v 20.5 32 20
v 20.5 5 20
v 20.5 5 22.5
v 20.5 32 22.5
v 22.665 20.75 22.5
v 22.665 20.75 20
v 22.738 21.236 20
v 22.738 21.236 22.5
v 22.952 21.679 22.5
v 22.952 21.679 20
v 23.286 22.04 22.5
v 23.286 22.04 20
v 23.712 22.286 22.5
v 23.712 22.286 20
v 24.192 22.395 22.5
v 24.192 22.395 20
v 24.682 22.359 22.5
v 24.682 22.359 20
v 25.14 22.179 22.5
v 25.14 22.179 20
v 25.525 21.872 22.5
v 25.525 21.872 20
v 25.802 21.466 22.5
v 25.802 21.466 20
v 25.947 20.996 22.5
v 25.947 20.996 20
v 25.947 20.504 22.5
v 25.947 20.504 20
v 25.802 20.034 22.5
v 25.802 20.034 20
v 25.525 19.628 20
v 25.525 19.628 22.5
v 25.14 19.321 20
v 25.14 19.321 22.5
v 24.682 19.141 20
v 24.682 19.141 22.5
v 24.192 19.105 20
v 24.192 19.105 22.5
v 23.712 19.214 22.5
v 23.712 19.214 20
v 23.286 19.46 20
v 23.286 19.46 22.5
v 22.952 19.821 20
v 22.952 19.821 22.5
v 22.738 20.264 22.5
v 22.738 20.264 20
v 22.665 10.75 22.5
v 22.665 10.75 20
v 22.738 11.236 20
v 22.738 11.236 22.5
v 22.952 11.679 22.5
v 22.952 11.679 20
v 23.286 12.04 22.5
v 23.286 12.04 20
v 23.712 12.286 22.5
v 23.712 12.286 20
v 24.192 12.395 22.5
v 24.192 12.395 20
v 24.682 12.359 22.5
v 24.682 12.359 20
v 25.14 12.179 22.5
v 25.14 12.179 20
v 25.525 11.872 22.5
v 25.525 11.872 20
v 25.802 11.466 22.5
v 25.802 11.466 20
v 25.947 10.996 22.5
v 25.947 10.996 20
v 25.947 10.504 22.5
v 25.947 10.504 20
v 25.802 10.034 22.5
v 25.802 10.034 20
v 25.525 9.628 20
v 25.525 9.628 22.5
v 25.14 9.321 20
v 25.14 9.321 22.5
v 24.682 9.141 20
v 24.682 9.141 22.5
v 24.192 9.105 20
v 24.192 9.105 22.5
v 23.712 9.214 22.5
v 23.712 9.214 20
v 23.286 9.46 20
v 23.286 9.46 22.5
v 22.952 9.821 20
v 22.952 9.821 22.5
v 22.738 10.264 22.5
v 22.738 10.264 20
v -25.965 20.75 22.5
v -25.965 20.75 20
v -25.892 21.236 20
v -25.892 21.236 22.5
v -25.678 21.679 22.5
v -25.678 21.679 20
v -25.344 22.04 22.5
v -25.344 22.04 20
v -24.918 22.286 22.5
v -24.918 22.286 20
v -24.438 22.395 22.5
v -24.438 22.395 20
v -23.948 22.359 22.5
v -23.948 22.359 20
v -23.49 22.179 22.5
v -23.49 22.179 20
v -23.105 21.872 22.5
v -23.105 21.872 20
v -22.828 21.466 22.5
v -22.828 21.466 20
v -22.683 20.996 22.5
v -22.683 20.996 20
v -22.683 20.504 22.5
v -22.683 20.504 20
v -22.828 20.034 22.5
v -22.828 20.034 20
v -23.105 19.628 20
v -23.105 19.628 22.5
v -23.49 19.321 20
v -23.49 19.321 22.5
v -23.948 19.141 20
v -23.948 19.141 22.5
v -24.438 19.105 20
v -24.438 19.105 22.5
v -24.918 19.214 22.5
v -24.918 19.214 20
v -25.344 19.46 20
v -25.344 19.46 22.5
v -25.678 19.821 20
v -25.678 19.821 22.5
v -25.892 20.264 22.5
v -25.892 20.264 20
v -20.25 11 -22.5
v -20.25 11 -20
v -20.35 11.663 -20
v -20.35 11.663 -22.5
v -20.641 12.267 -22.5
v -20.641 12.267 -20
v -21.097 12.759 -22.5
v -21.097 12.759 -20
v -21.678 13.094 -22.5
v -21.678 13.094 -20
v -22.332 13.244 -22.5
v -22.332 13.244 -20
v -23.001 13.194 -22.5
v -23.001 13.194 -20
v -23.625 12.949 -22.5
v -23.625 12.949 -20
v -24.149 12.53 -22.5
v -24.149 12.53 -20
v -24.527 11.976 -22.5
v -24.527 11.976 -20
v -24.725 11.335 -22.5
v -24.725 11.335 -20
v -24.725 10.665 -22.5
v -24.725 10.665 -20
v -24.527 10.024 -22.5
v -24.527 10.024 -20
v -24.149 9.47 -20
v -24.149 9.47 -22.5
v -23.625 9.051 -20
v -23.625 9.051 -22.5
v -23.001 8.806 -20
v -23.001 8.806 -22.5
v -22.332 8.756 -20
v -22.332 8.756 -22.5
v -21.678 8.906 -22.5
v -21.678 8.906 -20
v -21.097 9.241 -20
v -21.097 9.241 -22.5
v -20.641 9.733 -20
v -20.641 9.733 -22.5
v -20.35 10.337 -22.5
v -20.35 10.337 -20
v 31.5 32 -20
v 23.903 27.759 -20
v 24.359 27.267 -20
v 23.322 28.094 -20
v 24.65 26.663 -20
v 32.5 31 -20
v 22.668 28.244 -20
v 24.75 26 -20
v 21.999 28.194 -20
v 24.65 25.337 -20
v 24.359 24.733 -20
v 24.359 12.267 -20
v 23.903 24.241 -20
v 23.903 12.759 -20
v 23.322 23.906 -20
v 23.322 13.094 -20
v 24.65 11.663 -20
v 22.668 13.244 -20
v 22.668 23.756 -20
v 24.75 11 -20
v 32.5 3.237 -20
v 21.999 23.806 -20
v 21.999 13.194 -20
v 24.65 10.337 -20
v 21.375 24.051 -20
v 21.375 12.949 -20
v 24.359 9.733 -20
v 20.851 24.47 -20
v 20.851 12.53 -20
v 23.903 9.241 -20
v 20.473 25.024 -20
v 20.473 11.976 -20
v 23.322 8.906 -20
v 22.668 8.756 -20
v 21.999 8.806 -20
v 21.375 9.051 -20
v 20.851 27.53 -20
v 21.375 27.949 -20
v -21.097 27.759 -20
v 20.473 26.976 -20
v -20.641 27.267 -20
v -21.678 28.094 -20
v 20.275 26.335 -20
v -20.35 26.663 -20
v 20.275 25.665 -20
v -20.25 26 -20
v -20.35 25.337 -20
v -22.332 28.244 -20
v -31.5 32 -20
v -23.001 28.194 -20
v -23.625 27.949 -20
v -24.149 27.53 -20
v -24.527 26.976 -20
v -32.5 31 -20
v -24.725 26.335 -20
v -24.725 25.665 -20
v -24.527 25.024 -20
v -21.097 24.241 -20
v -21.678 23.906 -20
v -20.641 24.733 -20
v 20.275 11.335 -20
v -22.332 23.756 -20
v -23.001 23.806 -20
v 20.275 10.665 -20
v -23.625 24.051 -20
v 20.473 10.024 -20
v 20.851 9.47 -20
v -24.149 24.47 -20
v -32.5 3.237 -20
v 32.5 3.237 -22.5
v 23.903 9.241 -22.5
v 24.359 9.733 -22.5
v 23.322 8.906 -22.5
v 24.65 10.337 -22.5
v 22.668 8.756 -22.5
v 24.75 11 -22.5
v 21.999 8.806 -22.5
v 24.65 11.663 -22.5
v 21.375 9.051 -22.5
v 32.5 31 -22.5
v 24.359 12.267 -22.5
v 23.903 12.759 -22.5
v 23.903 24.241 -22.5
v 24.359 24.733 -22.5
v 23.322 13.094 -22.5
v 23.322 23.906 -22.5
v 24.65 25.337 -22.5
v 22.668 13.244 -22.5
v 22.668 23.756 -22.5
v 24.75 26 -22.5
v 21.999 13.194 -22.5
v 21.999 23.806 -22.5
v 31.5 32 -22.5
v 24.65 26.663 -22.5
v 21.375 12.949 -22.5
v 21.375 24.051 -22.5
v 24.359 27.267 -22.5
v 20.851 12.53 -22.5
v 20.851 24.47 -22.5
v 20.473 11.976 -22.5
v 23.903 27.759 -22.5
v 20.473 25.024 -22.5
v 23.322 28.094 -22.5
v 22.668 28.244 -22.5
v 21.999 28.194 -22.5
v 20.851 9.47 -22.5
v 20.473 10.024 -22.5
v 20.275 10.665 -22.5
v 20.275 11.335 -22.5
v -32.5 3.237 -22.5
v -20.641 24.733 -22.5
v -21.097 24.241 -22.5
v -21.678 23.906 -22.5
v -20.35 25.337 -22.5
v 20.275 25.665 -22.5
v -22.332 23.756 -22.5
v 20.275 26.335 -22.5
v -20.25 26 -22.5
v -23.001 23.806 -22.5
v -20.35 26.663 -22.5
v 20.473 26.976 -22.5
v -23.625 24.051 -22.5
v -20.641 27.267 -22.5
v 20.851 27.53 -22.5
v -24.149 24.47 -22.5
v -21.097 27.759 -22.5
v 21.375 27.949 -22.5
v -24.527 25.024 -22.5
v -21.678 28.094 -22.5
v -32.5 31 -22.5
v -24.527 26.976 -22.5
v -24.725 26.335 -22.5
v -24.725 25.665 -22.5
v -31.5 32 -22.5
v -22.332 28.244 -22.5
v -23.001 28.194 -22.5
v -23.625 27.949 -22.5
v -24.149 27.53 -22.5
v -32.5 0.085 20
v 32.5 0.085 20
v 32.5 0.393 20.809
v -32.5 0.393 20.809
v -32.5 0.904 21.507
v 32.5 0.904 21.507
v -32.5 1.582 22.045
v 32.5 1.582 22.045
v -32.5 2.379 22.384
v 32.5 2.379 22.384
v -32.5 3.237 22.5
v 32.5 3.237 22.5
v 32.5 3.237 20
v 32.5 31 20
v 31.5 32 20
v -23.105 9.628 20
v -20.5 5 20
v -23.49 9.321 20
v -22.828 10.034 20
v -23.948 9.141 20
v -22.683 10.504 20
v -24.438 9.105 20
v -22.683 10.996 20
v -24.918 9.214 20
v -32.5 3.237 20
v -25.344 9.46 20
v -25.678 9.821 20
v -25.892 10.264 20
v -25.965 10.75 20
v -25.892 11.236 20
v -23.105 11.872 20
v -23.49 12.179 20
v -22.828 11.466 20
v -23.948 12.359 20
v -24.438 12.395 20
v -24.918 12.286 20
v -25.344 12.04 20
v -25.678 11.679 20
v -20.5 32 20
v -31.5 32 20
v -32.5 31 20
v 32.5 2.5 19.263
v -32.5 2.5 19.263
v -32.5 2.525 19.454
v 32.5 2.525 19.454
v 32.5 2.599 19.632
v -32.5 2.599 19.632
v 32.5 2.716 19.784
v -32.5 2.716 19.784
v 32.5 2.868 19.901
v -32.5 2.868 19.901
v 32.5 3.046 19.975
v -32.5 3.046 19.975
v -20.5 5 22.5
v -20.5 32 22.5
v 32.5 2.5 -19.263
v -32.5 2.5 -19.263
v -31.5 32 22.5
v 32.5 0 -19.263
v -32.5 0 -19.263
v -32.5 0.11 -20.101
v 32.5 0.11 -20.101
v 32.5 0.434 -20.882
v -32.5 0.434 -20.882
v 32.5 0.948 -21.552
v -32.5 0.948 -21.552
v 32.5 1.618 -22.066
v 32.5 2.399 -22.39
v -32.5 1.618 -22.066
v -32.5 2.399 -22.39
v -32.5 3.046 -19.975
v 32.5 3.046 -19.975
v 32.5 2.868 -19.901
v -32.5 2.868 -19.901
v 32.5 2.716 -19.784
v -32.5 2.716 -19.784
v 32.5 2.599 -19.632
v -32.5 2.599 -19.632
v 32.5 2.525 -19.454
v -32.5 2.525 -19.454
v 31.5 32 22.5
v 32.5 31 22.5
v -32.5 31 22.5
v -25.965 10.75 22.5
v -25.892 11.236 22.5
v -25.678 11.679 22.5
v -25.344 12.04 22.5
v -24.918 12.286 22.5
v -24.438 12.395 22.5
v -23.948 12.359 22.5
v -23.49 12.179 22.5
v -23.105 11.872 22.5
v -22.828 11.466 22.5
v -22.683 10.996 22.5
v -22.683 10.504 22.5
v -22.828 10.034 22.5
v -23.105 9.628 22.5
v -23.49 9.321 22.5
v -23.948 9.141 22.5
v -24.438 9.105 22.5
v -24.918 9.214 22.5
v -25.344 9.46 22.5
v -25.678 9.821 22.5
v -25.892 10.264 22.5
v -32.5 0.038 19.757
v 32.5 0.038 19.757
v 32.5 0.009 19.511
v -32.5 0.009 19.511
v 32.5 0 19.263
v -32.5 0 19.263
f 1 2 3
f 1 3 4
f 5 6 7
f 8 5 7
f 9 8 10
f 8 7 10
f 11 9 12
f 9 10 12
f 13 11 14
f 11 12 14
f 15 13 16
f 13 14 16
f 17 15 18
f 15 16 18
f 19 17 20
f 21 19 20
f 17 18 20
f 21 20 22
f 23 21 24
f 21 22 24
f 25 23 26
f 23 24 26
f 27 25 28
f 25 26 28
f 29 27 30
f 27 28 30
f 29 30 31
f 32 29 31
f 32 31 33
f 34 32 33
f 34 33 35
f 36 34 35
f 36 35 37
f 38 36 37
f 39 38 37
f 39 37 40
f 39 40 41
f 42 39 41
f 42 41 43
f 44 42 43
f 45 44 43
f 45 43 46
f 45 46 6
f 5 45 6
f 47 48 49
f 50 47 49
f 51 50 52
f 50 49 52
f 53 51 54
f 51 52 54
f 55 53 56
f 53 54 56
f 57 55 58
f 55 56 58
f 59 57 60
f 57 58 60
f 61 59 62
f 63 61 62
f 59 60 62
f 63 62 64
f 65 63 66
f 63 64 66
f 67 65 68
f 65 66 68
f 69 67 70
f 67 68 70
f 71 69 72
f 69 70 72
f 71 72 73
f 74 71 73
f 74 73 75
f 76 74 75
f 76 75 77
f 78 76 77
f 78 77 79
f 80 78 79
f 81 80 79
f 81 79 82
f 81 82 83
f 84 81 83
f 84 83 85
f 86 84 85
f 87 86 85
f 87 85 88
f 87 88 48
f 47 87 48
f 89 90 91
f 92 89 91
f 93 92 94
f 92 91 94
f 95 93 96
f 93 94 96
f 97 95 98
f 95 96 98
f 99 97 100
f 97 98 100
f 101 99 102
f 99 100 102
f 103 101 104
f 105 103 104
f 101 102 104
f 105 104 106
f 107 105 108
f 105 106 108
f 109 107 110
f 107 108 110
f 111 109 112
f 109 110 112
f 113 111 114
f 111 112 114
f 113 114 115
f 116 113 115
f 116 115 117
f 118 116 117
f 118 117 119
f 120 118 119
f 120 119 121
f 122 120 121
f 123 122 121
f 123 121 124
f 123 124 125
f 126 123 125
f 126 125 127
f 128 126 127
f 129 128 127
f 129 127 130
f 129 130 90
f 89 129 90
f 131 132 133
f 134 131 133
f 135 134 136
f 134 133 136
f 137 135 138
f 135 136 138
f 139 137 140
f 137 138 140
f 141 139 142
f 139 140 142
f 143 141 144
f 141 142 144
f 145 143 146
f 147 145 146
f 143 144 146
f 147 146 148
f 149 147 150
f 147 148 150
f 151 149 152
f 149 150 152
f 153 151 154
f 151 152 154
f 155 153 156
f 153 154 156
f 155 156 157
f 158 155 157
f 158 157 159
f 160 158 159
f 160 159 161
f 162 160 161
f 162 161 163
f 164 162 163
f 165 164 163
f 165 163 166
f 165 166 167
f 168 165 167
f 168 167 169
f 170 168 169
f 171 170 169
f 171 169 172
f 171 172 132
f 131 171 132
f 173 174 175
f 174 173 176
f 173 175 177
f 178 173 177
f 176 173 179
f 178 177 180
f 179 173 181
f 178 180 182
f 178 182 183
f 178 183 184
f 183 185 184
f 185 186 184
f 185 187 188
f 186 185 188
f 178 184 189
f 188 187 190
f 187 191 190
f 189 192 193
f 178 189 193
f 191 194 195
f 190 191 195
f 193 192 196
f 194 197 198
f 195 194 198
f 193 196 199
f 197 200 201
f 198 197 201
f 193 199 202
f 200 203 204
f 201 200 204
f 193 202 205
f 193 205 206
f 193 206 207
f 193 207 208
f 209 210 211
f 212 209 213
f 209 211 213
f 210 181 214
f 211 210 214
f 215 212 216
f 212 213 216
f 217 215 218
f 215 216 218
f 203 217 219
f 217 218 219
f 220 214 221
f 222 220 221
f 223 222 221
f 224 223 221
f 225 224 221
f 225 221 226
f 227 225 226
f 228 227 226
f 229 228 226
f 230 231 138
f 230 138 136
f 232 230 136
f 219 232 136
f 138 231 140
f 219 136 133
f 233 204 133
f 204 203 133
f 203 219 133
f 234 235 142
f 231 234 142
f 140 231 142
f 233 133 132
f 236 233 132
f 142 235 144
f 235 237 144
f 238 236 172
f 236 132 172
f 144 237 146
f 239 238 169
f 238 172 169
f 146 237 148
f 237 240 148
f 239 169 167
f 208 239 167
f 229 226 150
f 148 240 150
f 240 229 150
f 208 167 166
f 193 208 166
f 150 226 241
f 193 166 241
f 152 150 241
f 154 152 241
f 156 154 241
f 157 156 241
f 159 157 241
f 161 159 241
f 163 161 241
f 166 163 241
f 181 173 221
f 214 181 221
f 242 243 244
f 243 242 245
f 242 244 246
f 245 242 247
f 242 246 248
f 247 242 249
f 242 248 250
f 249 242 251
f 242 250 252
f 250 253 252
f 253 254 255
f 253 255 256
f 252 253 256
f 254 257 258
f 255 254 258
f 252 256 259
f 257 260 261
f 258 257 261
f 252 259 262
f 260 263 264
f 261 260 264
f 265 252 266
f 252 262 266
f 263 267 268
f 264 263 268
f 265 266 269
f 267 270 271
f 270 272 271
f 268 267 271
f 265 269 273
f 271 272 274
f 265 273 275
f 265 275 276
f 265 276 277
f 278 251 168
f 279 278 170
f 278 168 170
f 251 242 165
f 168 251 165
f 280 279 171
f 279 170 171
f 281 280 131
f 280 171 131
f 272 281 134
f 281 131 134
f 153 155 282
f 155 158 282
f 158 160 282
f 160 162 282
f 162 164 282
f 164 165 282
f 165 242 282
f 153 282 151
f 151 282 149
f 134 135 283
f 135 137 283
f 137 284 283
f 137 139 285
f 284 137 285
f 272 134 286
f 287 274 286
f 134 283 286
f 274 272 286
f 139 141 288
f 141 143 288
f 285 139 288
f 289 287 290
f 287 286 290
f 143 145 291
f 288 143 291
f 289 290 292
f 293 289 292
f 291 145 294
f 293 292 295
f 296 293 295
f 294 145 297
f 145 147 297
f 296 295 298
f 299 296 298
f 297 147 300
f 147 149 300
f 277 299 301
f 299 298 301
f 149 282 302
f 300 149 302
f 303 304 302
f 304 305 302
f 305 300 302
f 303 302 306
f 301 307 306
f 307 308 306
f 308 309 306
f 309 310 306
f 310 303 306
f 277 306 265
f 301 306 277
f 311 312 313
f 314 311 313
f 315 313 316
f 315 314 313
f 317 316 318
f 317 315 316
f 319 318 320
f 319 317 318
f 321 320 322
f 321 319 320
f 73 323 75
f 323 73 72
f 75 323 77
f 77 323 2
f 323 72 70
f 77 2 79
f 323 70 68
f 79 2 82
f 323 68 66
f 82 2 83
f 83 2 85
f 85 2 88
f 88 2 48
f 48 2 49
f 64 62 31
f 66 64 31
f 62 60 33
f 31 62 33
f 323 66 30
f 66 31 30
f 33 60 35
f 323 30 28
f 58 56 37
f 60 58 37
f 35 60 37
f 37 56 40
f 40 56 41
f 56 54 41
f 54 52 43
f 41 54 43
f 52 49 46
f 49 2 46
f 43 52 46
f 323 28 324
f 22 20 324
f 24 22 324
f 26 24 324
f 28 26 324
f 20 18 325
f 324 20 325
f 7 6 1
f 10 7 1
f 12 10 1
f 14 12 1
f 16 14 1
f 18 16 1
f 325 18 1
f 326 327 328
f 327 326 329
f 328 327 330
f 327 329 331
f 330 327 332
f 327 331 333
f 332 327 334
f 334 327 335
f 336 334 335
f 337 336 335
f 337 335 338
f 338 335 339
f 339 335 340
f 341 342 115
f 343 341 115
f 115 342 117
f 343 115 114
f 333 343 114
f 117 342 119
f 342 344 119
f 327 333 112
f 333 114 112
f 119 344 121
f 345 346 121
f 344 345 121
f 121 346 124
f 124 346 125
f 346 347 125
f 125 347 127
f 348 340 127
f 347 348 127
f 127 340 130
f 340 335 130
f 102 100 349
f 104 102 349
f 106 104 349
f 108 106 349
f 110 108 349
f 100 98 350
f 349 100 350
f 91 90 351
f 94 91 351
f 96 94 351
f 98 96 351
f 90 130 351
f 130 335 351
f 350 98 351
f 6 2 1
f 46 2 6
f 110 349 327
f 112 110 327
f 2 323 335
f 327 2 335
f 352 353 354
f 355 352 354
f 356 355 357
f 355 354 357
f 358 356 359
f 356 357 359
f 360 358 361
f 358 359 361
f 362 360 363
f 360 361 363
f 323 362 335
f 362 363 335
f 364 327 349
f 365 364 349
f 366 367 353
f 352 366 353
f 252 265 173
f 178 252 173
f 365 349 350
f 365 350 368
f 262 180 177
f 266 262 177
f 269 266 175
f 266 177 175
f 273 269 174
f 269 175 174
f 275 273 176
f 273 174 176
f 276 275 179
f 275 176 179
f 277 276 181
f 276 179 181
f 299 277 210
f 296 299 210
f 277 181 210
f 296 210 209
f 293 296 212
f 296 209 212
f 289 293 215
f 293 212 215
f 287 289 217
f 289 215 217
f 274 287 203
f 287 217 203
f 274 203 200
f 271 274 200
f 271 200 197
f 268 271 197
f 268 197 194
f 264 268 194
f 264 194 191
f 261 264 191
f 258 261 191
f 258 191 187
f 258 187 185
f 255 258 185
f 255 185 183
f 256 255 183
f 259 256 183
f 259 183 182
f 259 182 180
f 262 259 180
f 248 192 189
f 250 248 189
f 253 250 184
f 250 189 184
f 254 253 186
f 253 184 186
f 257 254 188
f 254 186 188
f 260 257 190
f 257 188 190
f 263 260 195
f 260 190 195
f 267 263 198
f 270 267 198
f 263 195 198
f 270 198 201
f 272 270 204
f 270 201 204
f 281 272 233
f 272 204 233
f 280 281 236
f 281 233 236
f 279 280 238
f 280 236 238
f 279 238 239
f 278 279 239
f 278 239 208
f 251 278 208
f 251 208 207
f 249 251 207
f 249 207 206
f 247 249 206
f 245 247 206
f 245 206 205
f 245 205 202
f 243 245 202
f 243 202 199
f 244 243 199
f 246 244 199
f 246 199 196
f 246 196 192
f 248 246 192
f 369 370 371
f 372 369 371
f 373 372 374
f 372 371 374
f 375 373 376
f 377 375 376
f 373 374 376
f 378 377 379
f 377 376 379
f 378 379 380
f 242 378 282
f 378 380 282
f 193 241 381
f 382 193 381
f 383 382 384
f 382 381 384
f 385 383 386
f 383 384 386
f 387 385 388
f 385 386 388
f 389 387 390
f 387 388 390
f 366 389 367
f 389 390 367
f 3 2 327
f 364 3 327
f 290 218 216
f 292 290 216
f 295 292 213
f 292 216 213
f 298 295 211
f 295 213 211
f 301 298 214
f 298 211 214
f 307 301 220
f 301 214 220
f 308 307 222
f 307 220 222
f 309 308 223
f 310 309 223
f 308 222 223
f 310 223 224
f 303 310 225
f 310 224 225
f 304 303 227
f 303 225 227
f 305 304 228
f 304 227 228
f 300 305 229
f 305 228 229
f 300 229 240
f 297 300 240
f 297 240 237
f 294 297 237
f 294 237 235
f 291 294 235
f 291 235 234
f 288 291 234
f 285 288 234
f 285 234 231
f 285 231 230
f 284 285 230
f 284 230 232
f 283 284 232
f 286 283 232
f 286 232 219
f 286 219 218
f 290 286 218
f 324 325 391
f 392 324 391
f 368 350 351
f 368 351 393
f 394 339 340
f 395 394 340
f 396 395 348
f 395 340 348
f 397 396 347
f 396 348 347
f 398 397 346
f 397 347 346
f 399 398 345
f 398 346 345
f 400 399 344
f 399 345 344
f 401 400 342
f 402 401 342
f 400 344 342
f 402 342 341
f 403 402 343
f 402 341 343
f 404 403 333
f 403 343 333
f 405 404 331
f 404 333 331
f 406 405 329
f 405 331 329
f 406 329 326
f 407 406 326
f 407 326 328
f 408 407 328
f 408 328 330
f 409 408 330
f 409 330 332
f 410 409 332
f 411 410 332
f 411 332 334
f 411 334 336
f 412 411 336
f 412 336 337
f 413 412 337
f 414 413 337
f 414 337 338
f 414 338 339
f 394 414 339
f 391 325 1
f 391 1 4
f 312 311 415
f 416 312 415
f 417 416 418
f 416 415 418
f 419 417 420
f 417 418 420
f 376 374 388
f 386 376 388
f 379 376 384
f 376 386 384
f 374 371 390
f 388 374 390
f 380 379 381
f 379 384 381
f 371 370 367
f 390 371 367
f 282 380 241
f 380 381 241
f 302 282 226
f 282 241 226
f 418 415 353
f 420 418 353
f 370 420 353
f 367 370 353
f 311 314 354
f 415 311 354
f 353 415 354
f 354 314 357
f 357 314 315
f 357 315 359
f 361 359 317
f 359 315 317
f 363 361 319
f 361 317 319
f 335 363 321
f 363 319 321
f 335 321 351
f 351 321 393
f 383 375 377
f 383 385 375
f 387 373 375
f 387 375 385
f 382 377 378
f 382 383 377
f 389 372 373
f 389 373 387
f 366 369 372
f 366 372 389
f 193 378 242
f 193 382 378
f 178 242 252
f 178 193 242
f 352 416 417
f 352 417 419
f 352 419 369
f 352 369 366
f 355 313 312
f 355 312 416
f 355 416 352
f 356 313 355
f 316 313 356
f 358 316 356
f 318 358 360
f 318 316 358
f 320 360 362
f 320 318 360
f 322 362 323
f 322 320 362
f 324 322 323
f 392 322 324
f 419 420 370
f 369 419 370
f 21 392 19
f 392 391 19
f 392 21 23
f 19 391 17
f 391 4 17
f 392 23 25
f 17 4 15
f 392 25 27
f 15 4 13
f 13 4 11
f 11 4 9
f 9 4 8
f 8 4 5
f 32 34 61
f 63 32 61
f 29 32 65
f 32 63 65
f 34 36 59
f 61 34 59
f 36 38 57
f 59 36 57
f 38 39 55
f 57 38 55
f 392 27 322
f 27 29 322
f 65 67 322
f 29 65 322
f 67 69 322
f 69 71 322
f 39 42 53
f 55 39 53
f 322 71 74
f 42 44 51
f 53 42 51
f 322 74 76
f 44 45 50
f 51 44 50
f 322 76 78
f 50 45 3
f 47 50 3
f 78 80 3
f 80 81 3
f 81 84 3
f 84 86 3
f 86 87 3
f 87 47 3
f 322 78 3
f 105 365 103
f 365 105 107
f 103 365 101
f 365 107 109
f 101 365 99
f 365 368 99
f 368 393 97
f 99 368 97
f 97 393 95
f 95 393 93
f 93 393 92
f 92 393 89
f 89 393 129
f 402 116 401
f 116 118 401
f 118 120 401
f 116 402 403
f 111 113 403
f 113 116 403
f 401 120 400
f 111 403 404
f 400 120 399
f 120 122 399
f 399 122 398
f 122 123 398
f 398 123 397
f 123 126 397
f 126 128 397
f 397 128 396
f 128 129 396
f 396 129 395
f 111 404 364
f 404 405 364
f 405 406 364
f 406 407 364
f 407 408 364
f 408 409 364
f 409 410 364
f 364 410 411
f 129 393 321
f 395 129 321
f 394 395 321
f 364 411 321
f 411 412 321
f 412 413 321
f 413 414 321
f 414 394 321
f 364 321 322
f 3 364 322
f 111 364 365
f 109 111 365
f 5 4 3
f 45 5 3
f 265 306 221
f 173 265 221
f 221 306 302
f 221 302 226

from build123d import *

# Parameters (mm, degrees)
SM_BASE_FLANGE_1_DEPTH      = 32.5
HOLE_WIZARD_M4_1_D          = 3.3
HOLE_WIZARD_M4_1_DEPTH      = 11.5
HOLE_WIZARD_M4_1_TIP        = 0.991420021
OTHER_START                 = -32.5
OTHER_1_DEPTH               = 65
OTHER_1_2_DEPTH             = 65
CUT_EXTRUDE_1_REACH         = 79.484
SKETCH_11_W                 = 41
SKETCH_11_H                 = 27
OTHER_1_3_DEPTH             = 65
OTHER_1_3_2_DEPTH           = 65
HOLE_WIZARD_4_5_4_5_1_D     = 4.5
HOLE_WIZARD_4_5_4_5_1_DEPTH = 2.5
CHAMFER_1_SIZE              = 1


# Read off the part's stored shape, not the designer's step: 展开1, 折叠1
# Sheet-metal steps are written as plain solids
with BuildPart() as part:
    # Sketch 1 → 基体-法兰1 (new, symmetric)
    with BuildSketch(Plane(origin=(0, 0, 0), x_dir=(0, 0, -1), z_dir=(1, 0, 0))):
        with BuildLine():
            Line((-22.5, 32), (-22.5, 3.2366))
            ThreePointArc((-22.5, 3.2366), (-21.552021808, 0.947978192), (-19.2634, 0))
            Line((-19.2634, 0), (19.2634, 0))
            ThreePointArc((19.2634, 0), (21.552021808, 0.947978192), (22.5, 3.2366))
            Line((22.5, 3.2366), (22.5, 32))
            Line((22.5, 32), (20, 32))
            Line((20, 32), (20, 3.2366))
            ThreePointArc((20, 3.2366), (19.784254855, 2.715745145), (19.2634, 2.5))
            Line((19.2634, 2.5), (-19.2634, 2.5))
            ThreePointArc((-19.2634, 2.5), (-19.784254855, 2.715745145), (-20, 3.2366))
            Line((-20, 3.2366), (-20, 32))
            Line((-20, 32), (-22.5, 32))
        make_face()
    extrude(amount=SM_BASE_FLANGE_1_DEPTH, both=True)

    # M4 螺纹孔1
    with Locations(Plane(origin=(0, 6, 22.5), x_dir=(1, 0, 0), z_dir=(0, 0, 1))):
        with Locations((-24.315, 14.75), (-24.315, 4.75), (24.315, 14.75), (24.315, 4.75)):
            Hole(HOLE_WIZARD_M4_1_D / 2, depth=HOLE_WIZARD_M4_1_DEPTH)
            with Locations((0, 0, -(HOLE_WIZARD_M4_1_DEPTH + HOLE_WIZARD_M4_1_TIP / 2))):  # 118° drill point
                Cone(0, HOLE_WIZARD_M4_1_D / 2, HOLE_WIZARD_M4_1_TIP, mode=Mode.SUBTRACT)

    # Other 1 outline → Other 1 (cut)
    with BuildSketch(Plane.YZ.offset(OTHER_START)):
        with BuildLine():
            Line((3.2366, 20), (0.084933774, 20))
            ThreePointArc((0.084933774, 20), (0.021303554, 19.634140241), (0, 19.2634))
            Line((0, 19.2634), (0, -19.2634))
            ThreePointArc((0, -19.2634), (0.947978192, -21.552021808), (3.2366, -22.5))
            Line((3.2366, -22.5), (32, -22.5))
            Line((32, -22.5), (32, -20))
            Line((32, -20), (3.2366, -20))
            ThreePointArc((3.2366, -20), (2.715745145, -19.784254855), (2.5, -19.2634))
            Line((2.5, -19.2634), (2.5, 19.2634))
            ThreePointArc((2.5, 19.2634), (2.715745145, 19.784254855), (3.2366, 20))
        make_face()
    extrude(amount=OTHER_1_DEPTH, mode=Mode.SUBTRACT)

    # Other 1 2 outline → Other 1 2 (add)
    with BuildSketch(Plane.YZ.offset(OTHER_START)):
        with BuildLine():
            Line((3.2366, 22.5), (-70.294687966, 22.5))
            Line((-70.294687966, 22.5), (-70.294687966, 20))
            Line((-70.294687966, 20), (0.084933774, 20))
            ThreePointArc((0.084933774, 20), (1.225195018, 21.799110859), (3.2366, 22.5))
        make_face()
    extrude(amount=OTHER_1_2_DEPTH)

    # 草图11 → 切除-拉伸1 (cut, up to next)
    with BuildSketch(Plane(origin=(0, 0, 20), x_dir=(-1, 0, 0), z_dir=(0, 0, -1)), mode=Mode.PRIVATE) as cut_extrude_1_sk1:
        with Locations((0, 18.5)):
            Rectangle(SKETCH_11_W, SKETCH_11_H)
    cut_extrude_1_tool1 = extrude(cut_extrude_1_sk1.sketch, amount=-CUT_EXTRUDE_1_REACH, mode=Mode.PRIVATE) & part.part
    add(cut_extrude_1_tool1.solids().sort_by_distance((0, 18.5, 20))[0], mode=Mode.SUBTRACT)

    # Other 1 3 outline → Other 1 3 (cut)
    with BuildSketch(Plane.YZ.offset(OTHER_START)):
        with BuildLine():
            Line((-70.294687966, 20), (0.084933774, 20))
            ThreePointArc((0.084933774, 20), (1.225195018, 21.799110859), (3.2366, 22.5))
            Line((3.2366, 22.5), (-70.294687966, 22.5))
            Line((-70.294687966, 22.5), (-70.294687966, 20))
        make_face()
    extrude(amount=OTHER_1_3_DEPTH, mode=Mode.SUBTRACT)

    # Other 1 3 2 outline → Other 1 3 2 (add)
    with BuildSketch(Plane.YZ.offset(OTHER_START)):
        with BuildLine():
            ThreePointArc((0.084933774, 20), (0.021303554, 19.634140241), (0, 19.2634))
            Line((0, 19.2634), (0, -19.2634))
            ThreePointArc((0, -19.2634), (0.947978192, -21.552021808), (3.2366, -22.5))
            Line((3.2366, -22.5), (32, -22.5))
            Line((32, -22.5), (32, -20))
            Line((32, -20), (3.2366, -20))
            ThreePointArc((3.2366, -20), (2.715745145, -19.784254855), (2.5, -19.2634))
            Line((2.5, -19.2634), (2.5, 19.2634))
            ThreePointArc((2.5, 19.2634), (2.715745145, 19.784254855), (3.2366, 20))
            Line((3.2366, 20), (0.084933774, 20))
        make_face()
    extrude(amount=OTHER_1_3_2_DEPTH)

    # Ø4.5 (4.5) 直径孔1
    with Locations(Plane(origin=(0, 0, -22.5), x_dir=(-1, 0, 0), z_dir=(0, 0, -1))):
        with Locations((-22.5, 26), (-22.5, 11), (22.5, 26), (22.5, 11)):
            Hole(HOLE_WIZARD_4_5_4_5_1_D / 2, depth=HOLE_WIZARD_4_5_4_5_1_DEPTH)

    # 倒角1
    chamfer_1_edges = [part.edges().sort_by_distance(p)[0] for p in [
        (32.5, 32, 21.25),
        (-32.5, 32, 21.25),
        (32.5, 32, -21.25),
        (-32.5, 32, -21.25),
    ]]
    chamfer(chamfer_1_edges, length=CHAMFER_1_SIZE)


solid = part.part
